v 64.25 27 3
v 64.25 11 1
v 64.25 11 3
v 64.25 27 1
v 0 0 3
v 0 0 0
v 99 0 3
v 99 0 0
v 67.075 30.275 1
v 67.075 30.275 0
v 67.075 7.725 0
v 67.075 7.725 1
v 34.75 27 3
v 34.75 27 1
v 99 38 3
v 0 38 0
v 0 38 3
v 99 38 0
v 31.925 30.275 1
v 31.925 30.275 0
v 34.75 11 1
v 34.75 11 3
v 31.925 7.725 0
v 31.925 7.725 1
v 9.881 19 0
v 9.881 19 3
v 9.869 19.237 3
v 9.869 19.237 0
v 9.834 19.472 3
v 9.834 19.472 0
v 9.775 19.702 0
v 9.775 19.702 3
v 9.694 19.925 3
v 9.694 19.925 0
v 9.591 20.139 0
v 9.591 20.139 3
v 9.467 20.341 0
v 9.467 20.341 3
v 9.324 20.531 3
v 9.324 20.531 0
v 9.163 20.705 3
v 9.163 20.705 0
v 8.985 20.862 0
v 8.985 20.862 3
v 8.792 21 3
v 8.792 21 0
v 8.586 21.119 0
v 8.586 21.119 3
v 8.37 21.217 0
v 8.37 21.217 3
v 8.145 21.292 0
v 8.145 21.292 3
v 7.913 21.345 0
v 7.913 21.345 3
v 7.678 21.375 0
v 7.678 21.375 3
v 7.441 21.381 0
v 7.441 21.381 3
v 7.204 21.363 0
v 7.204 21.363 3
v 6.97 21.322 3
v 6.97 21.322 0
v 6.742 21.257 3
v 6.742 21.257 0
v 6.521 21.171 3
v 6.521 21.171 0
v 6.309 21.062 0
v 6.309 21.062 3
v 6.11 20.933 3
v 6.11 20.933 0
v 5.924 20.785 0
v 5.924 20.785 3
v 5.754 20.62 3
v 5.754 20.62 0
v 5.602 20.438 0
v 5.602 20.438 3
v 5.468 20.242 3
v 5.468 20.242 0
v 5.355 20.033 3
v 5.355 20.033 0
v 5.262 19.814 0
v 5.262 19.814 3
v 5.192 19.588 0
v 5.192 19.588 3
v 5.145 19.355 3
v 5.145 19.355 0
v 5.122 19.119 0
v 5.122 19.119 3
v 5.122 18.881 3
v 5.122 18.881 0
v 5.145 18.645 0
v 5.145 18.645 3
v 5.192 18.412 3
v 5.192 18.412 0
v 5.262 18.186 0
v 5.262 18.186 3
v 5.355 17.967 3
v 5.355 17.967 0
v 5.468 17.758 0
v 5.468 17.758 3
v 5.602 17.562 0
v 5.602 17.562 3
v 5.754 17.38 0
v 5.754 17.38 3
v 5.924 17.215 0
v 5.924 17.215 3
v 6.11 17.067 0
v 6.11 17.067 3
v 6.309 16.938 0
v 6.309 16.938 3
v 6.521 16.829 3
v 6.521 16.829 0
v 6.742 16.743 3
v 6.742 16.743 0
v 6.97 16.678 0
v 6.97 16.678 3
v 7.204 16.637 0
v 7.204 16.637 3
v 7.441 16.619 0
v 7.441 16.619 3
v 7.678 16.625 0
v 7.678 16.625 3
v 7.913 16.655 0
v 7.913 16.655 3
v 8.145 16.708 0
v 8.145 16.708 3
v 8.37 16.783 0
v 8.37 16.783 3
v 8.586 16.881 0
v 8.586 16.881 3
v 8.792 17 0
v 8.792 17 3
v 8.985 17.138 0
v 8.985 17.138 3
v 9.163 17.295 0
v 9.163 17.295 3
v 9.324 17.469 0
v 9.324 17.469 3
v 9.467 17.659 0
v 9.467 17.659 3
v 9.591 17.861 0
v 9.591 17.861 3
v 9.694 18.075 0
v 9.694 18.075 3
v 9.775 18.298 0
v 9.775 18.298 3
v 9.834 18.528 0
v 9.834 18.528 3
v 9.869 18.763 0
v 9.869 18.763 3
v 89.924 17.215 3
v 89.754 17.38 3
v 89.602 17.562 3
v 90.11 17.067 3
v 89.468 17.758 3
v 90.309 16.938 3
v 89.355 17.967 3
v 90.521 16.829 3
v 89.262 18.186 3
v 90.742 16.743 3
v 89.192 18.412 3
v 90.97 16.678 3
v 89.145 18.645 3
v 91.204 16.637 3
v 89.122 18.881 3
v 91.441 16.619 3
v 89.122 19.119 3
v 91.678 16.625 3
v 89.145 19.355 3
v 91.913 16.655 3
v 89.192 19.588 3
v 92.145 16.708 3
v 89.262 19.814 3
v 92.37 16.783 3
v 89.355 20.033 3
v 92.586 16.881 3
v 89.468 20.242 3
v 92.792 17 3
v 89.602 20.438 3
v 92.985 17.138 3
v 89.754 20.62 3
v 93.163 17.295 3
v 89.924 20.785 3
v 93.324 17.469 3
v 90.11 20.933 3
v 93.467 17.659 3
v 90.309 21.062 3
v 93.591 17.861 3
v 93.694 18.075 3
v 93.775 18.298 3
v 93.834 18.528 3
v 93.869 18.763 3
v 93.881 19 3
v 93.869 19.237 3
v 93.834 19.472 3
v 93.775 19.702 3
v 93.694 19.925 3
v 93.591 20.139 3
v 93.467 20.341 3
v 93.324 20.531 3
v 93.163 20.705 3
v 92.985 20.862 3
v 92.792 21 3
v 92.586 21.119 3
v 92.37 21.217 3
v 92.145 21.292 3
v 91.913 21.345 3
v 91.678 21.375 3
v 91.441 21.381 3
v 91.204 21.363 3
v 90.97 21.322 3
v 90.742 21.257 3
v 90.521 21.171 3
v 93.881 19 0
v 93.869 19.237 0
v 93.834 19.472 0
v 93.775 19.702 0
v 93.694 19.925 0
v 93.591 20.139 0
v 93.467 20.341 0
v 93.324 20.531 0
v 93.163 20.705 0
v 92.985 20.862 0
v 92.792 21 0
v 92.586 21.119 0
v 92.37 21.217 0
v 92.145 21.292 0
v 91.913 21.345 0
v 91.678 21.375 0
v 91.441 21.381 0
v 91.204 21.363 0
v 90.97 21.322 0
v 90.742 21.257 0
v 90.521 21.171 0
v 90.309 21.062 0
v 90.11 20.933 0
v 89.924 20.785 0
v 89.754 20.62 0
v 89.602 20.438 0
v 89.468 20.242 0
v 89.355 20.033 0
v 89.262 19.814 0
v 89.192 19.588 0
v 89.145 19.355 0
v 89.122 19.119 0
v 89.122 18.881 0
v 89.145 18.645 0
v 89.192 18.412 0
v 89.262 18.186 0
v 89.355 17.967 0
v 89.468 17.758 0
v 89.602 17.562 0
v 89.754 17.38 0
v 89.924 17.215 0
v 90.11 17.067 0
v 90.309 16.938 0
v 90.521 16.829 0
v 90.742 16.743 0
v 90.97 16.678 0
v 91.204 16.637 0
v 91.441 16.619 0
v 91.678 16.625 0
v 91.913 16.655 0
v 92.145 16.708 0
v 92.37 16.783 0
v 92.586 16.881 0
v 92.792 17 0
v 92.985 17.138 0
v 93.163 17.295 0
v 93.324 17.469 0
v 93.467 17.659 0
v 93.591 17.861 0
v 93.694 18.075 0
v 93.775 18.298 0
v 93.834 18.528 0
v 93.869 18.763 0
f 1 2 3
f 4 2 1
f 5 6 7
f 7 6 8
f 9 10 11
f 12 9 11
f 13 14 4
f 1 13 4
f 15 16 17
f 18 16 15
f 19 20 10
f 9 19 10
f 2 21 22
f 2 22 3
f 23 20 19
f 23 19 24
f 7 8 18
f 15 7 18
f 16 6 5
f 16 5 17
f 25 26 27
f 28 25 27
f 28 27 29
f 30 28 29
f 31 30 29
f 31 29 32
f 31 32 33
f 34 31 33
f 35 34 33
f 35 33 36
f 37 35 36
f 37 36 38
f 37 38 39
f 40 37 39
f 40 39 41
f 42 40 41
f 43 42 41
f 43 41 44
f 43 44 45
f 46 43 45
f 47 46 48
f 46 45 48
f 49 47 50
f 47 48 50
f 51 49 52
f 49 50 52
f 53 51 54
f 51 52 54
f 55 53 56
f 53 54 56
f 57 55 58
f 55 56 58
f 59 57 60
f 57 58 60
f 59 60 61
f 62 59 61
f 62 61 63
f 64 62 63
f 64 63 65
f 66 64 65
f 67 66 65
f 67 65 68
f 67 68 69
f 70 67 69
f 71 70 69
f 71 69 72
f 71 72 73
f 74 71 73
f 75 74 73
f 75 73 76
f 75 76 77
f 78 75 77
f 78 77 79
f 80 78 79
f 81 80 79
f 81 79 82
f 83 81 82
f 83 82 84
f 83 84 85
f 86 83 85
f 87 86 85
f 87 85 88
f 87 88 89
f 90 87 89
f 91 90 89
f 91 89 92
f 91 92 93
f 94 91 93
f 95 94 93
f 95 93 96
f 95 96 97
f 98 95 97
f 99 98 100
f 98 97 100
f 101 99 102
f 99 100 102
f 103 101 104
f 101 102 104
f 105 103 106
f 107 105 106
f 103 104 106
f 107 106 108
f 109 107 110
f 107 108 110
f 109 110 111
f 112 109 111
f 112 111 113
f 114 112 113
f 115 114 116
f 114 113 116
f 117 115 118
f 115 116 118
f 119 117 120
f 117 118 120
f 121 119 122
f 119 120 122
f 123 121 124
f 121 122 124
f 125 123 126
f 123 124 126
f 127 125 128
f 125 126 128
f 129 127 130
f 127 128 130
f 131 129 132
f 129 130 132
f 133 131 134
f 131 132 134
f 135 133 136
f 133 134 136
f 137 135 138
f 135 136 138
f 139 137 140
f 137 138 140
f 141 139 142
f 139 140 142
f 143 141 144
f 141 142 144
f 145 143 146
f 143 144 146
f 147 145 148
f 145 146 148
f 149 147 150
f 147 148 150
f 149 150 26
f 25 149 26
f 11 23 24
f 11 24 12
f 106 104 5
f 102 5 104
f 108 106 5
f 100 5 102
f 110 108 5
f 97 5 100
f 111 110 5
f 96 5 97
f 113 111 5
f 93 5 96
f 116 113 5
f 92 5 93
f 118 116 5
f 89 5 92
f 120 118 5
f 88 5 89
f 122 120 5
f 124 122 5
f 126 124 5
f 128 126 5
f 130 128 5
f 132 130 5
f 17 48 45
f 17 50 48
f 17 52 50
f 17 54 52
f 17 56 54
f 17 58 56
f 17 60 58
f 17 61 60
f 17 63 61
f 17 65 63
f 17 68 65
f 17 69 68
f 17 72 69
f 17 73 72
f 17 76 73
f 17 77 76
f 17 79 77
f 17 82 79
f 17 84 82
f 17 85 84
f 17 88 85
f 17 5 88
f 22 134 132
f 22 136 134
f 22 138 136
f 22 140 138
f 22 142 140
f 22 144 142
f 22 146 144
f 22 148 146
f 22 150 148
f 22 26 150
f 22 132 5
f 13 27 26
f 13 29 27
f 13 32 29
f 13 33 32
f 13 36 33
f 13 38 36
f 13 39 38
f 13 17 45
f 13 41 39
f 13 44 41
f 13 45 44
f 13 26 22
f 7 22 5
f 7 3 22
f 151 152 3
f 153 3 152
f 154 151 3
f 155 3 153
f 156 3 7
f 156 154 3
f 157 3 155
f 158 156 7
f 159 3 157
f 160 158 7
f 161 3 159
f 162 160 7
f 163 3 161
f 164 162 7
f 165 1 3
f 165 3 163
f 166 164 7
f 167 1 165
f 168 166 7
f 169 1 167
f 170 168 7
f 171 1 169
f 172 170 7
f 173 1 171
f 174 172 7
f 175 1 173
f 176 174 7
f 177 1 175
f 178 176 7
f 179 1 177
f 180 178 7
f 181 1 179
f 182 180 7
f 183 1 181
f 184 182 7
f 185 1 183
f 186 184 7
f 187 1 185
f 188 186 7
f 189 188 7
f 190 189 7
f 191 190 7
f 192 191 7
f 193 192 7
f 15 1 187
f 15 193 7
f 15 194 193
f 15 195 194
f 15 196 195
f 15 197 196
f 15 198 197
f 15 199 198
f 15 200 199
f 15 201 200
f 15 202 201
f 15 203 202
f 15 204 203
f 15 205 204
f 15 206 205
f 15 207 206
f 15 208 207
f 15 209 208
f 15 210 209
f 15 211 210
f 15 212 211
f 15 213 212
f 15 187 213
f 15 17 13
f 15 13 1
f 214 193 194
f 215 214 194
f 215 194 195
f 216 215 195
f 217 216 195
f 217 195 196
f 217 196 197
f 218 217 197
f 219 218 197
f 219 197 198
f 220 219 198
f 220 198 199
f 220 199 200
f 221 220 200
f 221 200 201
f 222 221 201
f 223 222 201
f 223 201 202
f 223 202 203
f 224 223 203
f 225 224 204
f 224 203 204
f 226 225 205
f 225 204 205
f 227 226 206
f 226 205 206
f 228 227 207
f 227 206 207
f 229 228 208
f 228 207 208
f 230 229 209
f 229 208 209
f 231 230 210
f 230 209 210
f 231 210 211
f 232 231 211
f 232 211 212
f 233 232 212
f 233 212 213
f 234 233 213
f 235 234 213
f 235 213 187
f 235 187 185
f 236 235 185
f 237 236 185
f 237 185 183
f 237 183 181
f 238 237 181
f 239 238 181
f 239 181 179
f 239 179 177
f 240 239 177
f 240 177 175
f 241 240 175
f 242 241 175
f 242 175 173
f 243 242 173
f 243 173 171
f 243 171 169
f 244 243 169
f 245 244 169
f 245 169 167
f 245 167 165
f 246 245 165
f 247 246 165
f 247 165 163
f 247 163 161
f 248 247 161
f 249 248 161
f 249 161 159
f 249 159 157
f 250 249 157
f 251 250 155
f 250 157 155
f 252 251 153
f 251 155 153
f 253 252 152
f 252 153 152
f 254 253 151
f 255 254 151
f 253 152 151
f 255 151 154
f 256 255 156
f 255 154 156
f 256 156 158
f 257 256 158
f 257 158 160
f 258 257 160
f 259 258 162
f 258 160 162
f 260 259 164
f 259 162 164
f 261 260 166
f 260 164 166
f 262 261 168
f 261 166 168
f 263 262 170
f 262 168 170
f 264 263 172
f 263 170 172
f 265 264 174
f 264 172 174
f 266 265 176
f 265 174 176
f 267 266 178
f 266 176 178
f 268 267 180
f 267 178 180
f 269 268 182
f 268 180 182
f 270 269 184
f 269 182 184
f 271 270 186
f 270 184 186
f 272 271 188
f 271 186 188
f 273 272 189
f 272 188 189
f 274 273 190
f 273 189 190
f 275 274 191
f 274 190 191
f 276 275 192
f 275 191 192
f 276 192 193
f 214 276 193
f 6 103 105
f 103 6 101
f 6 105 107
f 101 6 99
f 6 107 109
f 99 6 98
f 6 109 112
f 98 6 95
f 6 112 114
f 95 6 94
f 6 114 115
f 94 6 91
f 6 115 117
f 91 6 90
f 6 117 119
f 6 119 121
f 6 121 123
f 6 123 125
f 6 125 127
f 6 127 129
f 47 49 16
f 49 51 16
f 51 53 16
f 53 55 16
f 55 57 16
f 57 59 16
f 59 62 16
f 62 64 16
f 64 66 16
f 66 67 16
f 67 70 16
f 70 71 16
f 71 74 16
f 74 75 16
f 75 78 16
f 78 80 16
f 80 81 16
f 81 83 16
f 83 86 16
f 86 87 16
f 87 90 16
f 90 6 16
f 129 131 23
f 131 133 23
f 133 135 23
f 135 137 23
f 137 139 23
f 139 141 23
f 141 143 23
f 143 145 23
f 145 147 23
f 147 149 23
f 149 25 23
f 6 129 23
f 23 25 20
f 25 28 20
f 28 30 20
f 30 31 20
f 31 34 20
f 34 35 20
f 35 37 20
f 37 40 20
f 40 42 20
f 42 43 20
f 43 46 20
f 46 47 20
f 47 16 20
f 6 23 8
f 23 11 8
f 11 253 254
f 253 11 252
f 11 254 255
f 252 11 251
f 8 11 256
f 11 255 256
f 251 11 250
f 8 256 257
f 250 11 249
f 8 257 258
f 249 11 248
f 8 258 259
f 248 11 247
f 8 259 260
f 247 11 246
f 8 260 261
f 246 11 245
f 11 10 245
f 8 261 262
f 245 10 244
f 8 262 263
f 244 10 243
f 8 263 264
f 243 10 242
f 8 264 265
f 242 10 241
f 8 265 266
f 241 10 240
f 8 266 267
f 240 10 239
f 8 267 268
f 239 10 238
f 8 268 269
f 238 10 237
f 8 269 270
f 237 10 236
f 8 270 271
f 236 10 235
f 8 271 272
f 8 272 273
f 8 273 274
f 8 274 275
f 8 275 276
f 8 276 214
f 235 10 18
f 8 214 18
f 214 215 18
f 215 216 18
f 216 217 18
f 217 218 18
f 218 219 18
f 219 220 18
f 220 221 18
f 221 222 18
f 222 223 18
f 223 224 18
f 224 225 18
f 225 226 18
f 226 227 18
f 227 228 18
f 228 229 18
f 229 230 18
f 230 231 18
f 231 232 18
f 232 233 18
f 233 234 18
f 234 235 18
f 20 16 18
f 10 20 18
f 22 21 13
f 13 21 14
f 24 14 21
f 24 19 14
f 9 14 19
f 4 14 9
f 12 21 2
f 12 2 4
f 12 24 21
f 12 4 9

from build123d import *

# Parameters (mm, degrees)
F0_W     = 99
F0_H     = 38
F0_W_2   = 29.5
F0_H_2   = 16
F1_DEPTH = 3
F2_R     = 2.38125
F3_DEPTH = 3.001
F4_W     = 35.15
F4_H     = 22.55
F5_DEPTH = 1


with BuildPart() as f1:
    # F0 (on Top) → F1 (new body)
    with BuildSketch(Plane.XY):
        with Locations((49.5, 19)):
            Rectangle(F0_W, F0_H)
        with Locations((49.5, 19)):
            Rectangle(F0_W_2, F0_H_2, mode=Mode.SUBTRACT)
    extrude(amount=F1_DEPTH)

    # F2 (on face) → F3 (cut, through all)
    with BuildSketch(Plane.XY.offset(3)):
        with Locations((7.5, 19)):
            Circle(F2_R)
        with Locations((91.5, 19)):
            Circle(F2_R)
    extrude(amount=-F3_DEPTH, mode=Mode.SUBTRACT)

    # F4 (on face) → F5 (cut)
    with BuildSketch(Plane(origin=(0, 0, 0), x_dir=(1, 0, 0), z_dir=(0, 0, -1))):
        with Locations((49.5, -19)):
            Rectangle(F4_W, F4_H)
    extrude(amount=-F5_DEPTH, mode=Mode.SUBTRACT)


solid = f1.part
